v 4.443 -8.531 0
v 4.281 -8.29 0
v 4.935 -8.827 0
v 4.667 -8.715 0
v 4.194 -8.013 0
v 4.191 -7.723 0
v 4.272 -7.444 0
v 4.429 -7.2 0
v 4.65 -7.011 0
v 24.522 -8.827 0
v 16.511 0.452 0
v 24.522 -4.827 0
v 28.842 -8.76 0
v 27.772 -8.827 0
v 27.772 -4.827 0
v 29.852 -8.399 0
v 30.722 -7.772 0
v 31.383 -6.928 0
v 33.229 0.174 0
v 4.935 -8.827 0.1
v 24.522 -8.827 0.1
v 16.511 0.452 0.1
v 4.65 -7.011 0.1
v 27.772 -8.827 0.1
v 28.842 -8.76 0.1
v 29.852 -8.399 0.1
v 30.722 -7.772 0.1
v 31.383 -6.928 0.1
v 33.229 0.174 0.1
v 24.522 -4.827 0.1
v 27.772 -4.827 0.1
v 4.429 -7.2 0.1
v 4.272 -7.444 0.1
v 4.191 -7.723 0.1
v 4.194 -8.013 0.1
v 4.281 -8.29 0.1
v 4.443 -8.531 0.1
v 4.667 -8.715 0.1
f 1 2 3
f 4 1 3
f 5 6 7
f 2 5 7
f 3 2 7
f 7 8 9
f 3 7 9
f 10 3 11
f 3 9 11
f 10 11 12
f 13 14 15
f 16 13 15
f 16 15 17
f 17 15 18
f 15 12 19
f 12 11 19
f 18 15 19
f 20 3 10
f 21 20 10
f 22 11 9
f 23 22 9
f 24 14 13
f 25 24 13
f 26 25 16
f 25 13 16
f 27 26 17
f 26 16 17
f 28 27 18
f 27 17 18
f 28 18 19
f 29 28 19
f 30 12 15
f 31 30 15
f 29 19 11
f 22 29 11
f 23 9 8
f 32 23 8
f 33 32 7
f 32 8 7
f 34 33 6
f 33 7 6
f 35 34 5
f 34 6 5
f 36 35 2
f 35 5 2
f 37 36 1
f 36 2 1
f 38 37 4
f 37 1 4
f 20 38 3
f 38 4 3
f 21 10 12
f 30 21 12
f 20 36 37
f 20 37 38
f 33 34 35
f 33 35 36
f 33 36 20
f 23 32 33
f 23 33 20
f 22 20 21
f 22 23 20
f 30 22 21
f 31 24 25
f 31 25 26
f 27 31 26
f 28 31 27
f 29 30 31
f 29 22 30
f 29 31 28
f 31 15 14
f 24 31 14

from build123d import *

# Parameters (mm, degrees)
SALIENTE_EXTRUIR1_DEPTH = 0.1


with BuildPart() as part:
    # Model → Saliente-Extruir1 (new body)
    with BuildSketch(Plane.XY):
        with BuildLine():
            Line((33.228973848, 0.17393572), (16.510690428, 0.452082872))
            Line((16.510690428, 0.452082872), (4.649558375, -7.011379622))
            ThreePointArc((4.649558375, -7.011379622), (4.19427636, -8.013126504), (4.9350707, -8.826761725))
            Line((4.9350707, -8.826761725), (9.27203732, -8.826761725))
            Line((9.27203732, -8.826761725), (24.522151852, -8.826761725))
            Line((24.522151852, -8.826761725), (24.522151852, -4.826761725))
            Line((24.522151852, -4.826761725), (27.772151852, -4.826761725))
            Line((27.772151852, -4.826761725), (27.772151852, -8.826761725))
            ThreePointArc((27.772151852, -8.826761725), (29.852156514, -8.399354323), (31.383104023, -6.927859775))
            Line((31.383104023, -6.927859775), (33.228973848, 0.17393572))
        make_face()
    extrude(amount=SALIENTE_EXTRUIR1_DEPTH)


solid = part.part
